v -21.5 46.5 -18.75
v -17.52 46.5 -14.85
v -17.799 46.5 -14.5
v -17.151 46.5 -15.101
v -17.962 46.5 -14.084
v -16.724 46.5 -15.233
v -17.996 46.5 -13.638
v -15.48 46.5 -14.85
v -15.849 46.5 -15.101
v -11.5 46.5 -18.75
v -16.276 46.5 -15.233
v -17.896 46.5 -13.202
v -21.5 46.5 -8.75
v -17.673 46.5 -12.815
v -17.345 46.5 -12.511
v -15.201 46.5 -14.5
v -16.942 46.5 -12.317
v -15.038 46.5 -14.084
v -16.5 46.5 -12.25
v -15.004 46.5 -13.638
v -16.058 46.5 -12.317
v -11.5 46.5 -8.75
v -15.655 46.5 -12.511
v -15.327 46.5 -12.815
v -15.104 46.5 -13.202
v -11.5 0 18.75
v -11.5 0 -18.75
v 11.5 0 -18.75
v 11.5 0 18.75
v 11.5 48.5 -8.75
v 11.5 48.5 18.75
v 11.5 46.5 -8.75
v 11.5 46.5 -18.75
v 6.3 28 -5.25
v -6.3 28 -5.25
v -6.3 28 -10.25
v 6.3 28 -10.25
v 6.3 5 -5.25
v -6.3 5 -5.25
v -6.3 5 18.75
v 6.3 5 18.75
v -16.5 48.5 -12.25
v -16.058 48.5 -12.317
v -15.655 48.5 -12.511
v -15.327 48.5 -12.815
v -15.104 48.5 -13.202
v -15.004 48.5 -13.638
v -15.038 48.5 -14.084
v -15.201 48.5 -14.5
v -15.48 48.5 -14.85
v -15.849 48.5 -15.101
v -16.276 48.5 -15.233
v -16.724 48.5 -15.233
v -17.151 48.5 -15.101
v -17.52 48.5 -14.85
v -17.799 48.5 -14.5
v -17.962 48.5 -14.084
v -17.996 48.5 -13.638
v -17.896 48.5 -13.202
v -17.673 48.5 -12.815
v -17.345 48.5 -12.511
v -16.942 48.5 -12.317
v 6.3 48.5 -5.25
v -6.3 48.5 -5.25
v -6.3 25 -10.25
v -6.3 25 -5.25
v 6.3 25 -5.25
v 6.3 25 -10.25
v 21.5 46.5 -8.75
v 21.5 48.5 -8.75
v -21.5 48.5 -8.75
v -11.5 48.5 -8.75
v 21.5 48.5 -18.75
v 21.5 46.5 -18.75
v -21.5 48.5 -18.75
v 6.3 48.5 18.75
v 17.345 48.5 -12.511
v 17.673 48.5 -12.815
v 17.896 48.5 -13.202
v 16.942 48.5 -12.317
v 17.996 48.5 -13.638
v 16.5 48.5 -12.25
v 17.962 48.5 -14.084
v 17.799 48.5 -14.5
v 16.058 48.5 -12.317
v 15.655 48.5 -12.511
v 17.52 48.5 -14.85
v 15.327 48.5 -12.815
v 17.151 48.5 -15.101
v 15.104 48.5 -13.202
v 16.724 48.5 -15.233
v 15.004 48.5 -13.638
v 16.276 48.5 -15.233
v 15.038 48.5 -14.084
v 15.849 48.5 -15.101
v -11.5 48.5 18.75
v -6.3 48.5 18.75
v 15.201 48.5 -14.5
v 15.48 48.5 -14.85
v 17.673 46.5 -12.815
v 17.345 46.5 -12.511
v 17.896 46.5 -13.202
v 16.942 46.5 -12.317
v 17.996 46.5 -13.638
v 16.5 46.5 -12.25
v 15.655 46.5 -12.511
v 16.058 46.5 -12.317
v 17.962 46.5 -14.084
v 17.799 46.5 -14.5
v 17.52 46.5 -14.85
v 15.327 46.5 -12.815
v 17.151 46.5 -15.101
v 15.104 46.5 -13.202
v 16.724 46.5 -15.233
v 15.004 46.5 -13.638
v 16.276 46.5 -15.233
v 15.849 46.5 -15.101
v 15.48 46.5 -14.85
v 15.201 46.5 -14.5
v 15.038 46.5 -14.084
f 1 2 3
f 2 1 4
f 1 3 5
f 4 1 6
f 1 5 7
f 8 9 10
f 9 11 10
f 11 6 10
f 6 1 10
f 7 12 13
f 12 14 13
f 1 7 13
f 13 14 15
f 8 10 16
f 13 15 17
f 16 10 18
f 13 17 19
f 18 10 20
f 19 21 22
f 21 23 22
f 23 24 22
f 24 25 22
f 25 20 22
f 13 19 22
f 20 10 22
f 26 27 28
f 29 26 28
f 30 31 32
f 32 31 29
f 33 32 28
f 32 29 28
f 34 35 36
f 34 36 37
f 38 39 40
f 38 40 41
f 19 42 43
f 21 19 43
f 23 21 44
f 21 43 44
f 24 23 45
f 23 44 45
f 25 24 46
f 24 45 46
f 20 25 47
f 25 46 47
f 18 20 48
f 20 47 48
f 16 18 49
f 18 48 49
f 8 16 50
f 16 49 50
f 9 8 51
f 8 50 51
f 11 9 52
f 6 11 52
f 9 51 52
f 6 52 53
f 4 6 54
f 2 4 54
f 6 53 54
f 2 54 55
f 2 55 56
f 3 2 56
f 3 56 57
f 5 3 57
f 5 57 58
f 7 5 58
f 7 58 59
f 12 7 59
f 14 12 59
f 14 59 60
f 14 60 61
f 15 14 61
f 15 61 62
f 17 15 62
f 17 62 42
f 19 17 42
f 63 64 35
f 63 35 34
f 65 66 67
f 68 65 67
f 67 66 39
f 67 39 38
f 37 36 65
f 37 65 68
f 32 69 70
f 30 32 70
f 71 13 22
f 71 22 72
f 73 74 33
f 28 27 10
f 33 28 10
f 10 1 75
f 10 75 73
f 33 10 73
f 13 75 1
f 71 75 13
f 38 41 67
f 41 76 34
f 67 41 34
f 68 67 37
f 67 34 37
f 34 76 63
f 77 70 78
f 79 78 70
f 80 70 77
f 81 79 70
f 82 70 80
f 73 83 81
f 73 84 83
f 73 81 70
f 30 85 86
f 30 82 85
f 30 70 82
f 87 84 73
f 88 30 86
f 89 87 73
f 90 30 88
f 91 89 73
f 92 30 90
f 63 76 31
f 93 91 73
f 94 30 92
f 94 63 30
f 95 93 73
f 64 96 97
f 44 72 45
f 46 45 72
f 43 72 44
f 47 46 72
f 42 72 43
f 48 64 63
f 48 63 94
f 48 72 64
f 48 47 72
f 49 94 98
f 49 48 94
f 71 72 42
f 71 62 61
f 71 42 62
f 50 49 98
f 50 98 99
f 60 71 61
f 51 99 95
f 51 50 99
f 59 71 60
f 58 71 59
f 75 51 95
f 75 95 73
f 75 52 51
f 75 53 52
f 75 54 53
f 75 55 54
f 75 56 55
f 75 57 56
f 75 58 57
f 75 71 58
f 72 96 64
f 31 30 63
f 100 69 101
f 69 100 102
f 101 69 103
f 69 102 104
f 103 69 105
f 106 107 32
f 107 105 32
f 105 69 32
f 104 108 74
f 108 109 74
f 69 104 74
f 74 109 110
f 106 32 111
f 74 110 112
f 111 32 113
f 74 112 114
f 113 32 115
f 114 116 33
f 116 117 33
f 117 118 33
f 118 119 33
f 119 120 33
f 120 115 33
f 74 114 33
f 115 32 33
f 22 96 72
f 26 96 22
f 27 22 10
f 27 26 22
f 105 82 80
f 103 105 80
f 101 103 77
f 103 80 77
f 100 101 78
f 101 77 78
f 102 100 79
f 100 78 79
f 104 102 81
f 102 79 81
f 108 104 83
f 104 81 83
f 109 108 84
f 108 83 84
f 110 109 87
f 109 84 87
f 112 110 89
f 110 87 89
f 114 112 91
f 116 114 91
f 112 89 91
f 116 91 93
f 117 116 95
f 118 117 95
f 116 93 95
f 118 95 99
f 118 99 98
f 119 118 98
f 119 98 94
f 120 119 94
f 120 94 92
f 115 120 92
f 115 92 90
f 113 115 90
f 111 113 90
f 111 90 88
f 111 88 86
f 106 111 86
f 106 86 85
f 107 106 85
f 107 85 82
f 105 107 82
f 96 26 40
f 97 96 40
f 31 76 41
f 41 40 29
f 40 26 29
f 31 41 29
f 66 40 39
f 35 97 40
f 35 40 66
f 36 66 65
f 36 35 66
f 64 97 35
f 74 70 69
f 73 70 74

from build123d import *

# Parameters (mm, degrees)
SKETCH1_W           = 23
SKETCH1_H           = 37.5
BOSS_EXTRUDE1_DEPTH = 48.5
SKETCH2_W           = 12.6
SKETCH2_H           = 24
CUT_EXTRUDE1_DEPTH  = 43.5
SKETCH3_W           = 12.6
SKETCH3_H           = 3
CUT_EXTRUDE2_DEPTH  = 5
SKETCH4_W           = 10
SKETCH4_H           = 2
BOSS_EXTRUDE2_DEPTH = 10
SKETCH5_W           = 10
SKETCH5_H           = 2
BOSS_EXTRUDE3_DEPTH = 10
SKETCH6_R           = 1.5
CUT_EXTRUDE3_DEPTH  = 10


with BuildPart() as part:
    # Sketch1 → Boss-Extrude1 (new body)
    with BuildSketch(Plane(origin=(0, 0, 0), x_dir=(1, 0, 0), z_dir=(0, 1, 0))):
        Rectangle(SKETCH1_W, SKETCH1_H)
    extrude(amount=BOSS_EXTRUDE1_DEPTH)

    # Sketch2 → Cut-Extrude1 (cut)
    with BuildSketch(Plane(origin=(0, 48.5, 0), x_dir=(1, 0, 0), z_dir=(0, 1, 0))):
        with Locations((0, -6.75)):
            Rectangle(SKETCH2_W, SKETCH2_H)
    extrude(amount=-CUT_EXTRUDE1_DEPTH, mode=Mode.SUBTRACT)

    # Sketch3 → Cut-Extrude2 (cut)
    with BuildSketch(Plane.XY.offset(-5.25)):
        with Locations((0, 26.5)):
            Rectangle(SKETCH3_W, SKETCH3_H)
    extrude(amount=-CUT_EXTRUDE2_DEPTH, mode=Mode.SUBTRACT)

    # Sketch4 → Boss-Extrude2 (add)
    with BuildSketch(Plane.ZY.offset(11.5)):
        with Locations((-13.75, 47.5)):
            Rectangle(SKETCH4_W, SKETCH4_H)
    extrude(amount=BOSS_EXTRUDE2_DEPTH)

    # Sketch5 → Boss-Extrude3 (add)
    with BuildSketch(Plane(origin=(11.5, 0, 0), x_dir=(0, 0, -1), z_dir=(1, 0, 0))):
        with Locations((13.75, 47.5)):
            Rectangle(SKETCH5_W, SKETCH5_H)
    extrude(amount=BOSS_EXTRUDE3_DEPTH)

    # Sketch6 → Cut-Extrude3 (cut)
    with BuildSketch(Plane(origin=(0, 48.5, 0), x_dir=(1, 0, 0), z_dir=(0, 1, 0))):
        with Locations(Location((16.5, 13.75, 0), (0, 0, 270))):
            Circle(SKETCH6_R)
        with Locations(Location((-16.5, 13.75, 0), (0, 0, 270))):
            Circle(SKETCH6_R)
    extrude(amount=-CUT_EXTRUDE3_DEPTH, mode=Mode.SUBTRACT)


solid = part.part
